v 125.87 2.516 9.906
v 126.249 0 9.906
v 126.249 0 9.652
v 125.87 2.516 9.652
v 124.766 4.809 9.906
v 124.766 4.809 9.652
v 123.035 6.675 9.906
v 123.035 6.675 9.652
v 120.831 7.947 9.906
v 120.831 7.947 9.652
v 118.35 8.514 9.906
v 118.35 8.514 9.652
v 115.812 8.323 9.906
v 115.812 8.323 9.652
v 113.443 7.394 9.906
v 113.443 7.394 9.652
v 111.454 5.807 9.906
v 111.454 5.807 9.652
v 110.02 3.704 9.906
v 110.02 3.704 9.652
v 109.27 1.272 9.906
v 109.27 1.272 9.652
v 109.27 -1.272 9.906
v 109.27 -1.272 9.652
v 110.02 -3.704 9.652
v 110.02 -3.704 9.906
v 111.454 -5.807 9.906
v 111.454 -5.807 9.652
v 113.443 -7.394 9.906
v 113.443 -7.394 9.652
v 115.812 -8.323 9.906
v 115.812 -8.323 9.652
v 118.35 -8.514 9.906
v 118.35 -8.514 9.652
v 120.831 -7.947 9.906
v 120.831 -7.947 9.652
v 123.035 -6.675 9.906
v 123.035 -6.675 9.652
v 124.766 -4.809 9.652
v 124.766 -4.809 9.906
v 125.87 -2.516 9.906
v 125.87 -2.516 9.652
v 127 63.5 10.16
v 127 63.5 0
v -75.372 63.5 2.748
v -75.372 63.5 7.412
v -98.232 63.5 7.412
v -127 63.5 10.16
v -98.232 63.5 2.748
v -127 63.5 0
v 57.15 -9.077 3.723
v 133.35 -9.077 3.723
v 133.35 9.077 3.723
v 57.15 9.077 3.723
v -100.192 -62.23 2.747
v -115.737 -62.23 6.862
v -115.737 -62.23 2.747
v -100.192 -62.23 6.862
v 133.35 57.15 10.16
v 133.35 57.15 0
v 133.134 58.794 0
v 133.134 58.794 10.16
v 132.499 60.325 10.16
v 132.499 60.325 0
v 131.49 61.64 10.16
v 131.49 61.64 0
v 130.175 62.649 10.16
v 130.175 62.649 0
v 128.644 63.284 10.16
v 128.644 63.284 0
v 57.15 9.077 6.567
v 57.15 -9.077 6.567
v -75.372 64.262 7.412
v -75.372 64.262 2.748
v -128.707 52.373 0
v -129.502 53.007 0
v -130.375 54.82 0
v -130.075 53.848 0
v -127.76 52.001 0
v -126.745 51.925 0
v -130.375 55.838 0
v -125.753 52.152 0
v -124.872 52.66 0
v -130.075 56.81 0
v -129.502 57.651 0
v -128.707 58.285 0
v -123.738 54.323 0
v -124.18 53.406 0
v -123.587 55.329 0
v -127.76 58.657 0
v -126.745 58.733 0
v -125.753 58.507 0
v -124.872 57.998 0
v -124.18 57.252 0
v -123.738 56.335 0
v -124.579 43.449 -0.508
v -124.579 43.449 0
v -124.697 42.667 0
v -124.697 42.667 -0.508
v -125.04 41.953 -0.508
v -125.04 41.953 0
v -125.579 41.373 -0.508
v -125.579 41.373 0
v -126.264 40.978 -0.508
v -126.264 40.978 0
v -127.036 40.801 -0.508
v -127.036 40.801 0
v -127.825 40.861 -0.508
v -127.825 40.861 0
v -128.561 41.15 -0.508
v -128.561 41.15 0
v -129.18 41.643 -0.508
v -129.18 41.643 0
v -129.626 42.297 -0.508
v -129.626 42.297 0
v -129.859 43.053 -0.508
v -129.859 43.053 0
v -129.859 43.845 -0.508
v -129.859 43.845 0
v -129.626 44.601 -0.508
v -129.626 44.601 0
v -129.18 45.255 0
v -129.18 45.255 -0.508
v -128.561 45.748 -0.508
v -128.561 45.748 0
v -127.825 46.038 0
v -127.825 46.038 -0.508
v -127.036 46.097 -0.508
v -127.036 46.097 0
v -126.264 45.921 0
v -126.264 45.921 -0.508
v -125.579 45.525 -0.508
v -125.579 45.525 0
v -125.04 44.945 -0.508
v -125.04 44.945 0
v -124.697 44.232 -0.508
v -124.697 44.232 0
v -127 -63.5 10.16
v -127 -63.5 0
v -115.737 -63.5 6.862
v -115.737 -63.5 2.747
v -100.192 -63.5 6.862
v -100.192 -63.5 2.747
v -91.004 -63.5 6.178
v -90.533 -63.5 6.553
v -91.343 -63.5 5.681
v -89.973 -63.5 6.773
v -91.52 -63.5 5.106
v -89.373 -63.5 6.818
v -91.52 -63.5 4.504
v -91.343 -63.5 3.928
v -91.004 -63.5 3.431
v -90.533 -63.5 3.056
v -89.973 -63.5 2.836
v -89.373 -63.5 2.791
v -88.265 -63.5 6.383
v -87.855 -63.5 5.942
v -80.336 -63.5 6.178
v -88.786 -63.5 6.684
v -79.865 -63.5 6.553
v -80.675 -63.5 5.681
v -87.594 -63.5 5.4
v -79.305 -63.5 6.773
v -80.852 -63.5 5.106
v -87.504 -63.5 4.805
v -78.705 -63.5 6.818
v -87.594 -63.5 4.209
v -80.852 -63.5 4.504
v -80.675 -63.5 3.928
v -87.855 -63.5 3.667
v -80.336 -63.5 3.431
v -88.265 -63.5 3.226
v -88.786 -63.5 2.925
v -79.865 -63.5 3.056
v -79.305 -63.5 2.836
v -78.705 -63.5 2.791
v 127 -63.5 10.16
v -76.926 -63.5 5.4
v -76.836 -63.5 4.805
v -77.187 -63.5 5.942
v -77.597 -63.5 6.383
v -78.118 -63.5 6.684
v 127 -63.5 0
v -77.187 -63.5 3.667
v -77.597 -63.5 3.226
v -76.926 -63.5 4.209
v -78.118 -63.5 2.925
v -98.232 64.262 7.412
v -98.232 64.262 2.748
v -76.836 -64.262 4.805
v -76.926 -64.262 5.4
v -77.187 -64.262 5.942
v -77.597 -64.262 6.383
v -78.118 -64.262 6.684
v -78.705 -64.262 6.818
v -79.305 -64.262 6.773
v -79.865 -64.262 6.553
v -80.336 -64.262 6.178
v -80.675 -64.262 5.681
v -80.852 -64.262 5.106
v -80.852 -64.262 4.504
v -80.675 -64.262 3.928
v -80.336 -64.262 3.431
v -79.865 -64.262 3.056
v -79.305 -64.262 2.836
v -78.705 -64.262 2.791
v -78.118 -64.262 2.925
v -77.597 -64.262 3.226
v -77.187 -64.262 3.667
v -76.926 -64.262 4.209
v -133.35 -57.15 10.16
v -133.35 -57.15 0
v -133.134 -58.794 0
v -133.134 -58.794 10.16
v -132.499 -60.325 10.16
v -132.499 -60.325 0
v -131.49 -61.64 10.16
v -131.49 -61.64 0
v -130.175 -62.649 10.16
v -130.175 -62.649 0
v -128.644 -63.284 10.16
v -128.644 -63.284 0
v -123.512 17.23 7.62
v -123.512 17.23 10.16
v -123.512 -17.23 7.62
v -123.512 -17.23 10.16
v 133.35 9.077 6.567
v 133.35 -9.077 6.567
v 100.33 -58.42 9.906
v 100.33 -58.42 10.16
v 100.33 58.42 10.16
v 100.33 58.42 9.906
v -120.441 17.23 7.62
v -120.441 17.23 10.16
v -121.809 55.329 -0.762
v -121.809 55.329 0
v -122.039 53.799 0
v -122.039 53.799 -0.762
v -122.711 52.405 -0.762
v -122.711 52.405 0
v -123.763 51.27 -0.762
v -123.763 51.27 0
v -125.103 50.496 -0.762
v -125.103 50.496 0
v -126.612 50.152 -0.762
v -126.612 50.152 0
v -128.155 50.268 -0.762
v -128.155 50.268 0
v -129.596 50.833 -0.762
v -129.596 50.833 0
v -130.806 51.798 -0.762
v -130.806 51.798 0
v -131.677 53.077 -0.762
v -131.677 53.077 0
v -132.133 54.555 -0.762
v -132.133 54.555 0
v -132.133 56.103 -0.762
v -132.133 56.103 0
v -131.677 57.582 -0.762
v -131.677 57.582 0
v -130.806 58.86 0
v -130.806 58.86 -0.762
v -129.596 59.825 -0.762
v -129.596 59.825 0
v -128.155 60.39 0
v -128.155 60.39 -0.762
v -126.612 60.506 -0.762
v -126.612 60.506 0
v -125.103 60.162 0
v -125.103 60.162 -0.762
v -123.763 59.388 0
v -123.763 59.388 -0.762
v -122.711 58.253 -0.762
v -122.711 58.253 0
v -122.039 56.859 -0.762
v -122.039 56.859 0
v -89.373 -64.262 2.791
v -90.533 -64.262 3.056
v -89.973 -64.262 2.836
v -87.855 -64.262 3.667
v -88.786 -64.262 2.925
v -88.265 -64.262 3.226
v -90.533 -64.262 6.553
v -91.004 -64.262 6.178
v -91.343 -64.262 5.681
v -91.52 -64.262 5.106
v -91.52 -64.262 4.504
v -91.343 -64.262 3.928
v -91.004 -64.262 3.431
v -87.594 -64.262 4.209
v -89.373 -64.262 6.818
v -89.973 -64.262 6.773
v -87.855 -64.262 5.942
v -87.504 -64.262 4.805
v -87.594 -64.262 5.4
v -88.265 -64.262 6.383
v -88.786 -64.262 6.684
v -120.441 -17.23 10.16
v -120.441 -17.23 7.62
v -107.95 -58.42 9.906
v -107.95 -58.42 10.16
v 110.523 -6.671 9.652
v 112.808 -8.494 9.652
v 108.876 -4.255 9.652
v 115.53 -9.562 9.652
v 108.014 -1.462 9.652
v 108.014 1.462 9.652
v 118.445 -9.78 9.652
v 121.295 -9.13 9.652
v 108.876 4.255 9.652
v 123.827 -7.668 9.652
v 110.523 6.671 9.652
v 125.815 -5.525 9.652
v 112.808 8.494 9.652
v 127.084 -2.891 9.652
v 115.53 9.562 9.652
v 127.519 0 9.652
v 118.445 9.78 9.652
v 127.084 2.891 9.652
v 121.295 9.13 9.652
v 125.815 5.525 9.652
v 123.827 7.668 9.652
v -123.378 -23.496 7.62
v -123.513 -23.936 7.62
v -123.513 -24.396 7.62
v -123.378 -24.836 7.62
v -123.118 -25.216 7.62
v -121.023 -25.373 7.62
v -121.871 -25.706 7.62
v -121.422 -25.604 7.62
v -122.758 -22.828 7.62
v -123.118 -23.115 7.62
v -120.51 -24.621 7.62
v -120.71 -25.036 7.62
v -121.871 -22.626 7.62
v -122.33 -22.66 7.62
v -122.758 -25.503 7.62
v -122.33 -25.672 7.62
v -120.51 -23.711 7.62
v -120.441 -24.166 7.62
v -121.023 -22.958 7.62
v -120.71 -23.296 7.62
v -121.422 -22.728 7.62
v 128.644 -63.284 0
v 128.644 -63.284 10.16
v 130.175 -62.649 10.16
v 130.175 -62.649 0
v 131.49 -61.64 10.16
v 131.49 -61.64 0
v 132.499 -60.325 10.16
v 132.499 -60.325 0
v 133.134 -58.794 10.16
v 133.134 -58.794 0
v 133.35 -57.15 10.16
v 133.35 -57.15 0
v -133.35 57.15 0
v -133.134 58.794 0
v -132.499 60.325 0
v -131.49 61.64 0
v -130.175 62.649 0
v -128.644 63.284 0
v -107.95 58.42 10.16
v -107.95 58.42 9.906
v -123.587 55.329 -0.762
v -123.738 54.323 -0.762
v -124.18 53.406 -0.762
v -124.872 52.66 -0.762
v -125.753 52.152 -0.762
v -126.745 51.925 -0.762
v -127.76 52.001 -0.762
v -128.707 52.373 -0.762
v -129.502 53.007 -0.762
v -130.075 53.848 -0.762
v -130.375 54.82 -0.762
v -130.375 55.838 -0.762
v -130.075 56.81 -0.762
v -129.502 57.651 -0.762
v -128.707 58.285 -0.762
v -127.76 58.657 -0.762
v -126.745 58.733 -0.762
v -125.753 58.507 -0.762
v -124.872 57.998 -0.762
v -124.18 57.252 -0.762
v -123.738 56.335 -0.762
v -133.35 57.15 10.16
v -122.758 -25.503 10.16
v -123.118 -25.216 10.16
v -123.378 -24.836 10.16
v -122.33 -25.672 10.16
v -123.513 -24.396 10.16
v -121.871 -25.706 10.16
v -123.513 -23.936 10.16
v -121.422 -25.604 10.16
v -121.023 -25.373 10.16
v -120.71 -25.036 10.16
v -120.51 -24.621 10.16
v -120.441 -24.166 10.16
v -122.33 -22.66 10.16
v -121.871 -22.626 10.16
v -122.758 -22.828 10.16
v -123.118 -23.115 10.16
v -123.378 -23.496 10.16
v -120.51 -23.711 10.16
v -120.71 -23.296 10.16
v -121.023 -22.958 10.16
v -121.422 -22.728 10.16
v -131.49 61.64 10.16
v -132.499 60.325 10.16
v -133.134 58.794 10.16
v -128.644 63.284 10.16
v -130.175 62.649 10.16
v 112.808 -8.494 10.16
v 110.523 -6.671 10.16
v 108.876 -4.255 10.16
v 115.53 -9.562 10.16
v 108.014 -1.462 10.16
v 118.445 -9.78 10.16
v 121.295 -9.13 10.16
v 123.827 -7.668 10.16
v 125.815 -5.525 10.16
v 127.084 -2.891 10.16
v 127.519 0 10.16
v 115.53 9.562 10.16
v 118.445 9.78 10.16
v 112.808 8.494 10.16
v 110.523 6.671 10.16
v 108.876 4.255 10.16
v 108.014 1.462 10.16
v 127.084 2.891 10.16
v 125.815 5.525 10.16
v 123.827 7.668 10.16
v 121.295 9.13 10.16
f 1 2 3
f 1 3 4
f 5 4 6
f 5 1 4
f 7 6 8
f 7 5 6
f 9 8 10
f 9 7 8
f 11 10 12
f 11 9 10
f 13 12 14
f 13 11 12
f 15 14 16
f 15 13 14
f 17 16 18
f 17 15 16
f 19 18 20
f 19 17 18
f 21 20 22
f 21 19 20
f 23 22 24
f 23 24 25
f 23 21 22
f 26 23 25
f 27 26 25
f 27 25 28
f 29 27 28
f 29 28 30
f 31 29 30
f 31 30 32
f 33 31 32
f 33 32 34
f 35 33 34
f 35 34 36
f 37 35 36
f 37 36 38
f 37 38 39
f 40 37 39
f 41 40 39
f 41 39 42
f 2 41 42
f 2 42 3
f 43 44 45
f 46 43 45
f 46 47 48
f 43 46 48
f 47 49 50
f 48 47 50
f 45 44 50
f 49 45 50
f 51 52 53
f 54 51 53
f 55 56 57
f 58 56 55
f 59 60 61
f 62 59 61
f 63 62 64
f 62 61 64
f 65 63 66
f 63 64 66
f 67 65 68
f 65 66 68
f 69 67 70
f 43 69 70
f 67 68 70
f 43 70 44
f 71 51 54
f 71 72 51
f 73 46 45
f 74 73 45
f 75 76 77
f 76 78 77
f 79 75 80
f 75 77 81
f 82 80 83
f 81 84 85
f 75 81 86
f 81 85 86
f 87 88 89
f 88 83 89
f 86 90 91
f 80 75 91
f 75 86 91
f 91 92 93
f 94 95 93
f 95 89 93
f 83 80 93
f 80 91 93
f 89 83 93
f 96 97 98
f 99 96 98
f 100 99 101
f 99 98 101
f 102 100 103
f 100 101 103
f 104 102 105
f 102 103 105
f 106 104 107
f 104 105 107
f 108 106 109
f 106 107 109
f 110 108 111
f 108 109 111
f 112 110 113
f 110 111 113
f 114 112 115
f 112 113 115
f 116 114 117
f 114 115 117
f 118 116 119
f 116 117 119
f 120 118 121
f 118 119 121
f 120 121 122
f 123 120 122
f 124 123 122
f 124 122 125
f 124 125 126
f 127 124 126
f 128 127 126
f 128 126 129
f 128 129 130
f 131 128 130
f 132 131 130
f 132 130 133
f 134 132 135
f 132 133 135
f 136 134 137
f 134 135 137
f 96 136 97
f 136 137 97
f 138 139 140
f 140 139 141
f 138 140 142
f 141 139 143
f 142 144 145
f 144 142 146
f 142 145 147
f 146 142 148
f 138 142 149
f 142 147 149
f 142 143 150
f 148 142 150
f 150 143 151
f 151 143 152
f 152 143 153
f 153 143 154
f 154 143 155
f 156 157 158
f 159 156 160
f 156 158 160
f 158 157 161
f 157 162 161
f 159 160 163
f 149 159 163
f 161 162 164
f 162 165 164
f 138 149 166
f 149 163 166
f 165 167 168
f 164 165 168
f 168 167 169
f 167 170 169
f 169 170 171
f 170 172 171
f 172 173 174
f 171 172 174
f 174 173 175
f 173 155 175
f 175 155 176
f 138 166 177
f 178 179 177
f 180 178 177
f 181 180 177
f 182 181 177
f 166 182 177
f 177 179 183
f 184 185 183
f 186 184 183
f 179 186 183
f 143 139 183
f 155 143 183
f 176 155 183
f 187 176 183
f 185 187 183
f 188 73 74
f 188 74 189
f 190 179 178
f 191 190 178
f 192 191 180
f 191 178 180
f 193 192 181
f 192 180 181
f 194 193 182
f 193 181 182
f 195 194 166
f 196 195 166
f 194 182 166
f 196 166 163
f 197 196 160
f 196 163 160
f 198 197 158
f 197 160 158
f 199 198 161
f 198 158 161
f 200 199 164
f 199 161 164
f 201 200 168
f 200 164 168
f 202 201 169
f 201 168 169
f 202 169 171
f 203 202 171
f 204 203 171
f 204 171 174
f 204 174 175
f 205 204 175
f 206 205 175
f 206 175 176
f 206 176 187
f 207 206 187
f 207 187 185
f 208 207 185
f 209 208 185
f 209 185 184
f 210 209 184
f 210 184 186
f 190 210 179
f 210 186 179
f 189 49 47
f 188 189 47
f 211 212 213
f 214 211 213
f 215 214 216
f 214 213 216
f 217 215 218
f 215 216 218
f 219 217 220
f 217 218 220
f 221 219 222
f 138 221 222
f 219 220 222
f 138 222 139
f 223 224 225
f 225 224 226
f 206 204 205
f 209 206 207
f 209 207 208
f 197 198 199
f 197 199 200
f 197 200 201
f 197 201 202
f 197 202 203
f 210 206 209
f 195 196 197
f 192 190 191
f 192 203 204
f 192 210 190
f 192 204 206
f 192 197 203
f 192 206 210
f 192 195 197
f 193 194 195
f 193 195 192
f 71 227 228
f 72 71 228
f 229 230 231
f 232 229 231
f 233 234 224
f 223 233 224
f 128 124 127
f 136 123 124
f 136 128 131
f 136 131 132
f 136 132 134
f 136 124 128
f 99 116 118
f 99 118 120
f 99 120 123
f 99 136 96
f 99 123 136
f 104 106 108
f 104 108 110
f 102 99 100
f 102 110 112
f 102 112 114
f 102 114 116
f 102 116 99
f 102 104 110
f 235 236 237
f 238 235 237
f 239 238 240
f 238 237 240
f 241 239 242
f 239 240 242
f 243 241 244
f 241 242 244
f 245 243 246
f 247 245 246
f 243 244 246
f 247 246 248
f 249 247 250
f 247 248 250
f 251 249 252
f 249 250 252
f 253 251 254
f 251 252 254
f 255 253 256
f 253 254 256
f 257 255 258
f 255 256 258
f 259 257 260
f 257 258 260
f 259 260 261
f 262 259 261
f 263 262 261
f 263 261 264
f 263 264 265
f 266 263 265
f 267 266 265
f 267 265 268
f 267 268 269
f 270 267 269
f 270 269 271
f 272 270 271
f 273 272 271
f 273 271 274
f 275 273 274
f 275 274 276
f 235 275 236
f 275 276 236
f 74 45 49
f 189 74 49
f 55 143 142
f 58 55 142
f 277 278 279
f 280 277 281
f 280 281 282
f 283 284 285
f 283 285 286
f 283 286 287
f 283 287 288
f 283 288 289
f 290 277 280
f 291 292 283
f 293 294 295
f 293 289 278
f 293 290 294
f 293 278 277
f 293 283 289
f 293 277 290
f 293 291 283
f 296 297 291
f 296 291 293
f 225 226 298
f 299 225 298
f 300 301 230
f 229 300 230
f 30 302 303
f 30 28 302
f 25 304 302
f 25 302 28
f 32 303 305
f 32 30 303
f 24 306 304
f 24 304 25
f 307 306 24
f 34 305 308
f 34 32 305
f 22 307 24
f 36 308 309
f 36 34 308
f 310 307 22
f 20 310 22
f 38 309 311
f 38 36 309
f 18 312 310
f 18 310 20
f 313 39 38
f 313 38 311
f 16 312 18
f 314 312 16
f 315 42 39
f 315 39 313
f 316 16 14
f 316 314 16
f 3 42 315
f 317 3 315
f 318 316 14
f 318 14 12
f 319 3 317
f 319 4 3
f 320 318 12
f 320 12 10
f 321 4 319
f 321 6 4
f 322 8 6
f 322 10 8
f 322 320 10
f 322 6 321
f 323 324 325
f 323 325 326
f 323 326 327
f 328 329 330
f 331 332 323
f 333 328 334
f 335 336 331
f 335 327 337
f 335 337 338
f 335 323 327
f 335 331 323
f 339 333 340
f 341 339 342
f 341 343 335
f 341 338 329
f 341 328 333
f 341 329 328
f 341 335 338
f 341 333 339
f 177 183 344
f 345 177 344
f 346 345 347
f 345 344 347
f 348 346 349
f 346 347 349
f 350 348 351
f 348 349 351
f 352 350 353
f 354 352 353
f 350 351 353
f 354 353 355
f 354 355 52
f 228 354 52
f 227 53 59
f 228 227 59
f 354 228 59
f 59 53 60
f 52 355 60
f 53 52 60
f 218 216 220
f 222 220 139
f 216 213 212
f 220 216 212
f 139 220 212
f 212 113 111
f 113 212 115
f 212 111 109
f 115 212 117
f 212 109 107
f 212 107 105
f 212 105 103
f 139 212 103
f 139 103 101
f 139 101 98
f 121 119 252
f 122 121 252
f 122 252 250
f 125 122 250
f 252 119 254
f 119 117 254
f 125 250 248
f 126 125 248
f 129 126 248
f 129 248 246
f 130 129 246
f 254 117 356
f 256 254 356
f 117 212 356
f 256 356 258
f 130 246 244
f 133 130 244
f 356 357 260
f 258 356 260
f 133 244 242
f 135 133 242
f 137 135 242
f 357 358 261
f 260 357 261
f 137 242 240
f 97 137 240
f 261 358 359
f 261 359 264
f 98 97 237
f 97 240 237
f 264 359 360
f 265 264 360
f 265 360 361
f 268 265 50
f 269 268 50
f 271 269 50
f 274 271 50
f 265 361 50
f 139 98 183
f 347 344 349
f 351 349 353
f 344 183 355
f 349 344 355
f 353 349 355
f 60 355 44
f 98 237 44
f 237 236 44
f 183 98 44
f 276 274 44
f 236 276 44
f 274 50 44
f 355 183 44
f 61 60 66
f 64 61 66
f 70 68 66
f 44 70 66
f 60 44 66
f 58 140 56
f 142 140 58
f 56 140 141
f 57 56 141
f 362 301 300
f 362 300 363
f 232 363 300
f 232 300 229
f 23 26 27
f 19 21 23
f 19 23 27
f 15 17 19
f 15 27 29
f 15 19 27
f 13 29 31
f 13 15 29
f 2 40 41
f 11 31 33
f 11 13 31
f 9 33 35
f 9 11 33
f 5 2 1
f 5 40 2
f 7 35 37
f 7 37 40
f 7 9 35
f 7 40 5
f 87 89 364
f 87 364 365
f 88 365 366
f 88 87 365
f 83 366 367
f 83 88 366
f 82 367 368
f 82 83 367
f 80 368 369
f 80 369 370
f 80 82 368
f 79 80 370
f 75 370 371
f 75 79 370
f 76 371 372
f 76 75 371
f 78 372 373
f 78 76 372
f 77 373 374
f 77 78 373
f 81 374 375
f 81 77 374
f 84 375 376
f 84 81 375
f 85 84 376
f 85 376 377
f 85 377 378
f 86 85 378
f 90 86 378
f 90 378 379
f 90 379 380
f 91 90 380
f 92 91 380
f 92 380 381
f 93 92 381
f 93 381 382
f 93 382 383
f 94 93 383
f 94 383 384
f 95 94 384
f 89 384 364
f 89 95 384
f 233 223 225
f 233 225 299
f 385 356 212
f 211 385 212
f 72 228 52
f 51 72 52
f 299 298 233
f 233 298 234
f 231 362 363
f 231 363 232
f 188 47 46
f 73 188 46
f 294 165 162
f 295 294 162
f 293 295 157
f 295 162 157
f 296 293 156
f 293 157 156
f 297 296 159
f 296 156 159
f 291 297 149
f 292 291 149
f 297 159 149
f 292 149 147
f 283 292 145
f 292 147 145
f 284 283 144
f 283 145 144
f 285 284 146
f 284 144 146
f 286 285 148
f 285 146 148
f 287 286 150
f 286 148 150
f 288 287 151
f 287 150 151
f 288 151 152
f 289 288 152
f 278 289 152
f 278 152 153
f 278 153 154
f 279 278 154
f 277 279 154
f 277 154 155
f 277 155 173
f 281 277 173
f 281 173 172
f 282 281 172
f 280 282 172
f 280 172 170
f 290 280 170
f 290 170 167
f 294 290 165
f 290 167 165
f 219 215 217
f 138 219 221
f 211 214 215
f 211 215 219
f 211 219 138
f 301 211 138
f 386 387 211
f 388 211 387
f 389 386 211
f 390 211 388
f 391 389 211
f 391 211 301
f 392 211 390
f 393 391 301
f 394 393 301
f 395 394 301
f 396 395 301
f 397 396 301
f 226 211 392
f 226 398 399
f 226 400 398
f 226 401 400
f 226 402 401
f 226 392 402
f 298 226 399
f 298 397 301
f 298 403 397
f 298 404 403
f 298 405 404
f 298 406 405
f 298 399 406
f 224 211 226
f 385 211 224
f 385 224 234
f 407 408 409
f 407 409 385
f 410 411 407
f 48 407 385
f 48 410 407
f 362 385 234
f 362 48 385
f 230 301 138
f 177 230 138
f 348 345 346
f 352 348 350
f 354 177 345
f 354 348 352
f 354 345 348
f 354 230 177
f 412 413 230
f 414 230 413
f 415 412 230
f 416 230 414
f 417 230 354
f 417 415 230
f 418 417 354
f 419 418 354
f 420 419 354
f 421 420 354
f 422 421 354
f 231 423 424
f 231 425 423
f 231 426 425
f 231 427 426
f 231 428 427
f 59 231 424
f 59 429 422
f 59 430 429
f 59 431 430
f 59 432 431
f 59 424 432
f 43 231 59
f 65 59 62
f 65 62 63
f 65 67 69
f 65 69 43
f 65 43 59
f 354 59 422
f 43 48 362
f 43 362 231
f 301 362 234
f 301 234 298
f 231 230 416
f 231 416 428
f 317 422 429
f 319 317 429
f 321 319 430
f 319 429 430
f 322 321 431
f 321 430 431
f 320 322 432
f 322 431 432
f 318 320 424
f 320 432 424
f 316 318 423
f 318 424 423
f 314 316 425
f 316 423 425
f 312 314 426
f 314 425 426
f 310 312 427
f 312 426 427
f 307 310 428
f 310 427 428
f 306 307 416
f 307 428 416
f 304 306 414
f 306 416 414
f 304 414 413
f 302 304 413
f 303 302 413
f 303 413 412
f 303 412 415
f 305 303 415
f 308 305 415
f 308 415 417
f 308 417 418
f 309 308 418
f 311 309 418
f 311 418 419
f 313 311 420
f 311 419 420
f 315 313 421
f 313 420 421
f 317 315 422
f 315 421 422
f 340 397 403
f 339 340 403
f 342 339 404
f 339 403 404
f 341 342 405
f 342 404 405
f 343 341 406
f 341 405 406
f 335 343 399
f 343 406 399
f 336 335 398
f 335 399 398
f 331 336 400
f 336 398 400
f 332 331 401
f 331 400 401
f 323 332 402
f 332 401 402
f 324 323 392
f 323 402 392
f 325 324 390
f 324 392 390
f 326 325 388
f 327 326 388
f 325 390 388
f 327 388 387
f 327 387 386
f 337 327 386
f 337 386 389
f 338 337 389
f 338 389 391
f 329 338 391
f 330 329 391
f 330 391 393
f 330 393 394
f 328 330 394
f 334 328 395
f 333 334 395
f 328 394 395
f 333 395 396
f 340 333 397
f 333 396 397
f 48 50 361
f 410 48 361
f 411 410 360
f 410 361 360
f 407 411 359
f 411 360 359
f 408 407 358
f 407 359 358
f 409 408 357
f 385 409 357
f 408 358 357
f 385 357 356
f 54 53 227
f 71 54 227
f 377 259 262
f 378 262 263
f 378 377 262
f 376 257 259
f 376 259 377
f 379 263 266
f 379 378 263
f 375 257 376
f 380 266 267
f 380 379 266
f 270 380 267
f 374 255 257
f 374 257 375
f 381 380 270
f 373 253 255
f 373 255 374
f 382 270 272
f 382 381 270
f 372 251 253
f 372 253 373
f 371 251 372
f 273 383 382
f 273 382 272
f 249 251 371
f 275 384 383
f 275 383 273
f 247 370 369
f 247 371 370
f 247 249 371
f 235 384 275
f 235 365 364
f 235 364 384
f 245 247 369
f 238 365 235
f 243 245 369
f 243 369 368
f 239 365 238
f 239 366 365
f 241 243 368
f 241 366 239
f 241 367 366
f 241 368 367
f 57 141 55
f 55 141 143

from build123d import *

# Parameters (mm, degrees)
F1_DEPTH  = 10.16
F2_W      = 208.28
F2_H      = 116.84
F3_DEPTH  = 0.254
F4_R      = 9.807477688
F4_R_2    = 8.537478745
F5_DEPTH  = 0.508
F6_DEPTH  = 0.254
F7_W      = 15.5448025422
F7_H      = 2.0574
F8_DEPTH  = 1.27
F9_DEPTH  = 0.254
F10_R     = 2.0193
F11_DEPTH = 0.762
F13_DEPTH = 2.54
F14_R     = 1.5445798635
F15_DEPTH = 2.54
F17_DEPTH = 76.2
F19_DEPTH = 0.762
F20_R     = 5.191457902
F20_R_2   = 3.4134577513
F21_DEPTH = 0.762
F22_DEPTH = 0.762
F23_R     = 2.6550671555
F24_DEPTH = 0.508


with BuildPart() as f1:
    # F0 (on Top) → F1 (new body)
    with BuildSketch(Plane.XY):
        with BuildLine():
            Line((-133.35, 0), (-133.35, -50.8))
            Line((-133.35, -50.8), (-133.35, -57.15))
            ThreePointArc((-133.35, -57.15), (-131.4901280605, -61.6401280605), (-127, -63.5))
            Line((-127, -63.5), (-120.65, -63.5))
            Line((-120.65, -63.5), (0, -63.5))
            Line((0, -63.5), (0, 0))
            Line((0, 0), (-133.35, 0))
        make_face()
        with BuildLine():
            Line((-133.35, 50.8), (-133.35, 0))
            Line((-133.35, 0), (0, 0))
            Line((0, 0), (0, 63.5))
            Line((0, 63.5), (-120.65, 63.5))
            Line((-120.65, 63.5), (-127, 63.5))
            ThreePointArc((-127, 63.5), (-131.4901280605, 61.6401280605), (-133.35, 57.15))
            Line((-133.35, 57.15), (-133.35, 50.8))
        make_face()
        with BuildLine():
            Line((0, 63.5), (0, 0))
            Line((0, 0), (0, -63.5))
            Line((0, -63.5), (120.65, -63.5))
            Line((120.65, -63.5), (127, -63.5))
            ThreePointArc((127, -63.5), (131.4901280605, -61.6401280605), (133.35, -57.15))
            Line((133.35, -57.15), (133.35, -50.8))
            Line((133.35, -50.8), (133.35, 50.8))
            Line((133.35, 50.8), (133.35, 57.15))
            ThreePointArc((133.35, 57.15), (131.4901280605, 61.6401280605), (127, 63.5))
            Line((127, 63.5), (120.65, 63.5))
            Line((120.65, 63.5), (0, 63.5))
        make_face()
    extrude(amount=F1_DEPTH)

    # F2 (on face) → F3 (cut)
    with BuildSketch(Plane.XY.offset(10.16)):
        with Locations((-3.81, 0)):
            Rectangle(F2_W, F2_H)
    extrude(amount=-F3_DEPTH, mode=Mode.SUBTRACT)

    # F4 (on face) → F5 (cut)
    with BuildSketch(Plane.XY.offset(10.16)):
        with Locations((117.7119389176, 0)):
            Circle(F4_R)
        with Locations((117.7119389176, 0)):
            Circle(F4_R_2, mode=Mode.SUBTRACT)
    extrude(amount=-F5_DEPTH, mode=Mode.SUBTRACT)

    # F6 (cut): a face of the model
    f6_faces = [f1.faces().sort_by_distance(p)[0] for p in [
        (117.7119389176, 0, 10.16),
    ]]
    extrude(f6_faces, amount=-F6_DEPTH, mode=Mode.SUBTRACT)

    # F7 (on face) → F8 (cut)
    with BuildSketch(Plane.XZ.offset(63.5)):
        with Locations((-107.9641506076, 5.8332554431)):
            Rectangle(F7_W, F7_H)
        with Locations((-107.9641506076, 3.7758554431)):
            Rectangle(F7_W, F7_H)
    extrude(amount=-F8_DEPTH, mode=Mode.SUBTRACT)

    # F7 (on face) → F9 (cut)
    with BuildSketch(Plane.XZ.offset(63.5)):
        with Locations((-107.9641506076, 5.8332554431)):
            Rectangle(F7_W, F7_H)
    extrude(amount=-F9_DEPTH, mode=Mode.SUBTRACT)

    # F10 (on face) → F11 (join)
    with BuildSketch(Plane.XZ.offset(63.5)):
        with Locations((-78.8557493365, 4.8045554431)):
            Circle(F10_R)
        with Locations((-89.5237493365, 4.8045554431)):
            Circle(F10_R)
    extrude(amount=F11_DEPTH)

    # F12 (on face) → F13 (cut)
    with BuildSketch(Plane.XY.offset(10.16)):
        Polygon((-120.4414889216, 17.2302983701), (-123.5122457147, 17.2302983701), (-123.5122457147, 0), (-123.5122457147, -17.2302983701), (-120.4414889216, -17.2302983701), (-120.4414889216, 0), align=None)
    extrude(amount=-F13_DEPTH, mode=Mode.SUBTRACT)

    # F14 (on face) → F15 (cut)
    with BuildSketch(Plane.XY.offset(10.16)):
        with Locations((-121.9860687852, -24.1657830775)):
            Circle(F14_R)
    extrude(amount=-F15_DEPTH, mode=Mode.SUBTRACT)

    # F16 (on face) → F17 (cut)
    with BuildSketch(Plane.YZ.offset(133.35)):
        Polygon((-9.0773701668, 3.7233135663), (0, 3.7233135663), (9.0773701668, 3.7233135663), (9.0773701668, 6.5667750314), (0, 6.5667750314), (-9.0773701668, 6.5667750314), align=None)
    extrude(amount=-F17_DEPTH, mode=Mode.SUBTRACT)

    # F18 (on face) → F19 (join)
    with BuildSketch(Plane(origin=(0, 63.5, 0), x_dir=(-1, 0, 0), z_dir=(0, 1, 0))):
        Polygon((98.232159481, 7.4123111553), (75.372159481, 7.4123111553), (75.372159481, 5.08), (75.372159481, 2.7476888447), (91.6486978531, 2.7476888447), (98.232159481, 2.7476888447), (98.232159481, 5.08), align=None)
    extrude(amount=F19_DEPTH)

    # F20 (on face) → F21 (join)
    with BuildSketch(Plane(origin=(0, 0, 0), x_dir=(1, 0, 0), z_dir=(0, 0, -1))):
        with Locations((-127, -55.3290322423)):
            Circle(F20_R)
        with Locations((-127, -55.3290322423)):
            Circle(F20_R_2, mode=Mode.SUBTRACT)
    extrude(amount=F21_DEPTH)

    # F20 (on face) → F22 (join)
    with BuildSketch(Plane(origin=(0, 0, 0), x_dir=(1, 0, 0), z_dir=(0, 0, -1))):
        with Locations((-127, -55.3290322423)):
            Circle(F20_R)
        with Locations((-127, -55.3290322423)):
            Circle(F20_R_2, mode=Mode.SUBTRACT)
    extrude(amount=F22_DEPTH)

    # F23 (on face) → F24 (join)
    with BuildSketch(Plane(origin=(0, 0, 0), x_dir=(1, 0, 0), z_dir=(0, 0, -1))):
        with Locations((-127.2339522839, -43.4491336346)):
            Circle(F23_R)
    extrude(amount=F24_DEPTH)


solid = f1.part
